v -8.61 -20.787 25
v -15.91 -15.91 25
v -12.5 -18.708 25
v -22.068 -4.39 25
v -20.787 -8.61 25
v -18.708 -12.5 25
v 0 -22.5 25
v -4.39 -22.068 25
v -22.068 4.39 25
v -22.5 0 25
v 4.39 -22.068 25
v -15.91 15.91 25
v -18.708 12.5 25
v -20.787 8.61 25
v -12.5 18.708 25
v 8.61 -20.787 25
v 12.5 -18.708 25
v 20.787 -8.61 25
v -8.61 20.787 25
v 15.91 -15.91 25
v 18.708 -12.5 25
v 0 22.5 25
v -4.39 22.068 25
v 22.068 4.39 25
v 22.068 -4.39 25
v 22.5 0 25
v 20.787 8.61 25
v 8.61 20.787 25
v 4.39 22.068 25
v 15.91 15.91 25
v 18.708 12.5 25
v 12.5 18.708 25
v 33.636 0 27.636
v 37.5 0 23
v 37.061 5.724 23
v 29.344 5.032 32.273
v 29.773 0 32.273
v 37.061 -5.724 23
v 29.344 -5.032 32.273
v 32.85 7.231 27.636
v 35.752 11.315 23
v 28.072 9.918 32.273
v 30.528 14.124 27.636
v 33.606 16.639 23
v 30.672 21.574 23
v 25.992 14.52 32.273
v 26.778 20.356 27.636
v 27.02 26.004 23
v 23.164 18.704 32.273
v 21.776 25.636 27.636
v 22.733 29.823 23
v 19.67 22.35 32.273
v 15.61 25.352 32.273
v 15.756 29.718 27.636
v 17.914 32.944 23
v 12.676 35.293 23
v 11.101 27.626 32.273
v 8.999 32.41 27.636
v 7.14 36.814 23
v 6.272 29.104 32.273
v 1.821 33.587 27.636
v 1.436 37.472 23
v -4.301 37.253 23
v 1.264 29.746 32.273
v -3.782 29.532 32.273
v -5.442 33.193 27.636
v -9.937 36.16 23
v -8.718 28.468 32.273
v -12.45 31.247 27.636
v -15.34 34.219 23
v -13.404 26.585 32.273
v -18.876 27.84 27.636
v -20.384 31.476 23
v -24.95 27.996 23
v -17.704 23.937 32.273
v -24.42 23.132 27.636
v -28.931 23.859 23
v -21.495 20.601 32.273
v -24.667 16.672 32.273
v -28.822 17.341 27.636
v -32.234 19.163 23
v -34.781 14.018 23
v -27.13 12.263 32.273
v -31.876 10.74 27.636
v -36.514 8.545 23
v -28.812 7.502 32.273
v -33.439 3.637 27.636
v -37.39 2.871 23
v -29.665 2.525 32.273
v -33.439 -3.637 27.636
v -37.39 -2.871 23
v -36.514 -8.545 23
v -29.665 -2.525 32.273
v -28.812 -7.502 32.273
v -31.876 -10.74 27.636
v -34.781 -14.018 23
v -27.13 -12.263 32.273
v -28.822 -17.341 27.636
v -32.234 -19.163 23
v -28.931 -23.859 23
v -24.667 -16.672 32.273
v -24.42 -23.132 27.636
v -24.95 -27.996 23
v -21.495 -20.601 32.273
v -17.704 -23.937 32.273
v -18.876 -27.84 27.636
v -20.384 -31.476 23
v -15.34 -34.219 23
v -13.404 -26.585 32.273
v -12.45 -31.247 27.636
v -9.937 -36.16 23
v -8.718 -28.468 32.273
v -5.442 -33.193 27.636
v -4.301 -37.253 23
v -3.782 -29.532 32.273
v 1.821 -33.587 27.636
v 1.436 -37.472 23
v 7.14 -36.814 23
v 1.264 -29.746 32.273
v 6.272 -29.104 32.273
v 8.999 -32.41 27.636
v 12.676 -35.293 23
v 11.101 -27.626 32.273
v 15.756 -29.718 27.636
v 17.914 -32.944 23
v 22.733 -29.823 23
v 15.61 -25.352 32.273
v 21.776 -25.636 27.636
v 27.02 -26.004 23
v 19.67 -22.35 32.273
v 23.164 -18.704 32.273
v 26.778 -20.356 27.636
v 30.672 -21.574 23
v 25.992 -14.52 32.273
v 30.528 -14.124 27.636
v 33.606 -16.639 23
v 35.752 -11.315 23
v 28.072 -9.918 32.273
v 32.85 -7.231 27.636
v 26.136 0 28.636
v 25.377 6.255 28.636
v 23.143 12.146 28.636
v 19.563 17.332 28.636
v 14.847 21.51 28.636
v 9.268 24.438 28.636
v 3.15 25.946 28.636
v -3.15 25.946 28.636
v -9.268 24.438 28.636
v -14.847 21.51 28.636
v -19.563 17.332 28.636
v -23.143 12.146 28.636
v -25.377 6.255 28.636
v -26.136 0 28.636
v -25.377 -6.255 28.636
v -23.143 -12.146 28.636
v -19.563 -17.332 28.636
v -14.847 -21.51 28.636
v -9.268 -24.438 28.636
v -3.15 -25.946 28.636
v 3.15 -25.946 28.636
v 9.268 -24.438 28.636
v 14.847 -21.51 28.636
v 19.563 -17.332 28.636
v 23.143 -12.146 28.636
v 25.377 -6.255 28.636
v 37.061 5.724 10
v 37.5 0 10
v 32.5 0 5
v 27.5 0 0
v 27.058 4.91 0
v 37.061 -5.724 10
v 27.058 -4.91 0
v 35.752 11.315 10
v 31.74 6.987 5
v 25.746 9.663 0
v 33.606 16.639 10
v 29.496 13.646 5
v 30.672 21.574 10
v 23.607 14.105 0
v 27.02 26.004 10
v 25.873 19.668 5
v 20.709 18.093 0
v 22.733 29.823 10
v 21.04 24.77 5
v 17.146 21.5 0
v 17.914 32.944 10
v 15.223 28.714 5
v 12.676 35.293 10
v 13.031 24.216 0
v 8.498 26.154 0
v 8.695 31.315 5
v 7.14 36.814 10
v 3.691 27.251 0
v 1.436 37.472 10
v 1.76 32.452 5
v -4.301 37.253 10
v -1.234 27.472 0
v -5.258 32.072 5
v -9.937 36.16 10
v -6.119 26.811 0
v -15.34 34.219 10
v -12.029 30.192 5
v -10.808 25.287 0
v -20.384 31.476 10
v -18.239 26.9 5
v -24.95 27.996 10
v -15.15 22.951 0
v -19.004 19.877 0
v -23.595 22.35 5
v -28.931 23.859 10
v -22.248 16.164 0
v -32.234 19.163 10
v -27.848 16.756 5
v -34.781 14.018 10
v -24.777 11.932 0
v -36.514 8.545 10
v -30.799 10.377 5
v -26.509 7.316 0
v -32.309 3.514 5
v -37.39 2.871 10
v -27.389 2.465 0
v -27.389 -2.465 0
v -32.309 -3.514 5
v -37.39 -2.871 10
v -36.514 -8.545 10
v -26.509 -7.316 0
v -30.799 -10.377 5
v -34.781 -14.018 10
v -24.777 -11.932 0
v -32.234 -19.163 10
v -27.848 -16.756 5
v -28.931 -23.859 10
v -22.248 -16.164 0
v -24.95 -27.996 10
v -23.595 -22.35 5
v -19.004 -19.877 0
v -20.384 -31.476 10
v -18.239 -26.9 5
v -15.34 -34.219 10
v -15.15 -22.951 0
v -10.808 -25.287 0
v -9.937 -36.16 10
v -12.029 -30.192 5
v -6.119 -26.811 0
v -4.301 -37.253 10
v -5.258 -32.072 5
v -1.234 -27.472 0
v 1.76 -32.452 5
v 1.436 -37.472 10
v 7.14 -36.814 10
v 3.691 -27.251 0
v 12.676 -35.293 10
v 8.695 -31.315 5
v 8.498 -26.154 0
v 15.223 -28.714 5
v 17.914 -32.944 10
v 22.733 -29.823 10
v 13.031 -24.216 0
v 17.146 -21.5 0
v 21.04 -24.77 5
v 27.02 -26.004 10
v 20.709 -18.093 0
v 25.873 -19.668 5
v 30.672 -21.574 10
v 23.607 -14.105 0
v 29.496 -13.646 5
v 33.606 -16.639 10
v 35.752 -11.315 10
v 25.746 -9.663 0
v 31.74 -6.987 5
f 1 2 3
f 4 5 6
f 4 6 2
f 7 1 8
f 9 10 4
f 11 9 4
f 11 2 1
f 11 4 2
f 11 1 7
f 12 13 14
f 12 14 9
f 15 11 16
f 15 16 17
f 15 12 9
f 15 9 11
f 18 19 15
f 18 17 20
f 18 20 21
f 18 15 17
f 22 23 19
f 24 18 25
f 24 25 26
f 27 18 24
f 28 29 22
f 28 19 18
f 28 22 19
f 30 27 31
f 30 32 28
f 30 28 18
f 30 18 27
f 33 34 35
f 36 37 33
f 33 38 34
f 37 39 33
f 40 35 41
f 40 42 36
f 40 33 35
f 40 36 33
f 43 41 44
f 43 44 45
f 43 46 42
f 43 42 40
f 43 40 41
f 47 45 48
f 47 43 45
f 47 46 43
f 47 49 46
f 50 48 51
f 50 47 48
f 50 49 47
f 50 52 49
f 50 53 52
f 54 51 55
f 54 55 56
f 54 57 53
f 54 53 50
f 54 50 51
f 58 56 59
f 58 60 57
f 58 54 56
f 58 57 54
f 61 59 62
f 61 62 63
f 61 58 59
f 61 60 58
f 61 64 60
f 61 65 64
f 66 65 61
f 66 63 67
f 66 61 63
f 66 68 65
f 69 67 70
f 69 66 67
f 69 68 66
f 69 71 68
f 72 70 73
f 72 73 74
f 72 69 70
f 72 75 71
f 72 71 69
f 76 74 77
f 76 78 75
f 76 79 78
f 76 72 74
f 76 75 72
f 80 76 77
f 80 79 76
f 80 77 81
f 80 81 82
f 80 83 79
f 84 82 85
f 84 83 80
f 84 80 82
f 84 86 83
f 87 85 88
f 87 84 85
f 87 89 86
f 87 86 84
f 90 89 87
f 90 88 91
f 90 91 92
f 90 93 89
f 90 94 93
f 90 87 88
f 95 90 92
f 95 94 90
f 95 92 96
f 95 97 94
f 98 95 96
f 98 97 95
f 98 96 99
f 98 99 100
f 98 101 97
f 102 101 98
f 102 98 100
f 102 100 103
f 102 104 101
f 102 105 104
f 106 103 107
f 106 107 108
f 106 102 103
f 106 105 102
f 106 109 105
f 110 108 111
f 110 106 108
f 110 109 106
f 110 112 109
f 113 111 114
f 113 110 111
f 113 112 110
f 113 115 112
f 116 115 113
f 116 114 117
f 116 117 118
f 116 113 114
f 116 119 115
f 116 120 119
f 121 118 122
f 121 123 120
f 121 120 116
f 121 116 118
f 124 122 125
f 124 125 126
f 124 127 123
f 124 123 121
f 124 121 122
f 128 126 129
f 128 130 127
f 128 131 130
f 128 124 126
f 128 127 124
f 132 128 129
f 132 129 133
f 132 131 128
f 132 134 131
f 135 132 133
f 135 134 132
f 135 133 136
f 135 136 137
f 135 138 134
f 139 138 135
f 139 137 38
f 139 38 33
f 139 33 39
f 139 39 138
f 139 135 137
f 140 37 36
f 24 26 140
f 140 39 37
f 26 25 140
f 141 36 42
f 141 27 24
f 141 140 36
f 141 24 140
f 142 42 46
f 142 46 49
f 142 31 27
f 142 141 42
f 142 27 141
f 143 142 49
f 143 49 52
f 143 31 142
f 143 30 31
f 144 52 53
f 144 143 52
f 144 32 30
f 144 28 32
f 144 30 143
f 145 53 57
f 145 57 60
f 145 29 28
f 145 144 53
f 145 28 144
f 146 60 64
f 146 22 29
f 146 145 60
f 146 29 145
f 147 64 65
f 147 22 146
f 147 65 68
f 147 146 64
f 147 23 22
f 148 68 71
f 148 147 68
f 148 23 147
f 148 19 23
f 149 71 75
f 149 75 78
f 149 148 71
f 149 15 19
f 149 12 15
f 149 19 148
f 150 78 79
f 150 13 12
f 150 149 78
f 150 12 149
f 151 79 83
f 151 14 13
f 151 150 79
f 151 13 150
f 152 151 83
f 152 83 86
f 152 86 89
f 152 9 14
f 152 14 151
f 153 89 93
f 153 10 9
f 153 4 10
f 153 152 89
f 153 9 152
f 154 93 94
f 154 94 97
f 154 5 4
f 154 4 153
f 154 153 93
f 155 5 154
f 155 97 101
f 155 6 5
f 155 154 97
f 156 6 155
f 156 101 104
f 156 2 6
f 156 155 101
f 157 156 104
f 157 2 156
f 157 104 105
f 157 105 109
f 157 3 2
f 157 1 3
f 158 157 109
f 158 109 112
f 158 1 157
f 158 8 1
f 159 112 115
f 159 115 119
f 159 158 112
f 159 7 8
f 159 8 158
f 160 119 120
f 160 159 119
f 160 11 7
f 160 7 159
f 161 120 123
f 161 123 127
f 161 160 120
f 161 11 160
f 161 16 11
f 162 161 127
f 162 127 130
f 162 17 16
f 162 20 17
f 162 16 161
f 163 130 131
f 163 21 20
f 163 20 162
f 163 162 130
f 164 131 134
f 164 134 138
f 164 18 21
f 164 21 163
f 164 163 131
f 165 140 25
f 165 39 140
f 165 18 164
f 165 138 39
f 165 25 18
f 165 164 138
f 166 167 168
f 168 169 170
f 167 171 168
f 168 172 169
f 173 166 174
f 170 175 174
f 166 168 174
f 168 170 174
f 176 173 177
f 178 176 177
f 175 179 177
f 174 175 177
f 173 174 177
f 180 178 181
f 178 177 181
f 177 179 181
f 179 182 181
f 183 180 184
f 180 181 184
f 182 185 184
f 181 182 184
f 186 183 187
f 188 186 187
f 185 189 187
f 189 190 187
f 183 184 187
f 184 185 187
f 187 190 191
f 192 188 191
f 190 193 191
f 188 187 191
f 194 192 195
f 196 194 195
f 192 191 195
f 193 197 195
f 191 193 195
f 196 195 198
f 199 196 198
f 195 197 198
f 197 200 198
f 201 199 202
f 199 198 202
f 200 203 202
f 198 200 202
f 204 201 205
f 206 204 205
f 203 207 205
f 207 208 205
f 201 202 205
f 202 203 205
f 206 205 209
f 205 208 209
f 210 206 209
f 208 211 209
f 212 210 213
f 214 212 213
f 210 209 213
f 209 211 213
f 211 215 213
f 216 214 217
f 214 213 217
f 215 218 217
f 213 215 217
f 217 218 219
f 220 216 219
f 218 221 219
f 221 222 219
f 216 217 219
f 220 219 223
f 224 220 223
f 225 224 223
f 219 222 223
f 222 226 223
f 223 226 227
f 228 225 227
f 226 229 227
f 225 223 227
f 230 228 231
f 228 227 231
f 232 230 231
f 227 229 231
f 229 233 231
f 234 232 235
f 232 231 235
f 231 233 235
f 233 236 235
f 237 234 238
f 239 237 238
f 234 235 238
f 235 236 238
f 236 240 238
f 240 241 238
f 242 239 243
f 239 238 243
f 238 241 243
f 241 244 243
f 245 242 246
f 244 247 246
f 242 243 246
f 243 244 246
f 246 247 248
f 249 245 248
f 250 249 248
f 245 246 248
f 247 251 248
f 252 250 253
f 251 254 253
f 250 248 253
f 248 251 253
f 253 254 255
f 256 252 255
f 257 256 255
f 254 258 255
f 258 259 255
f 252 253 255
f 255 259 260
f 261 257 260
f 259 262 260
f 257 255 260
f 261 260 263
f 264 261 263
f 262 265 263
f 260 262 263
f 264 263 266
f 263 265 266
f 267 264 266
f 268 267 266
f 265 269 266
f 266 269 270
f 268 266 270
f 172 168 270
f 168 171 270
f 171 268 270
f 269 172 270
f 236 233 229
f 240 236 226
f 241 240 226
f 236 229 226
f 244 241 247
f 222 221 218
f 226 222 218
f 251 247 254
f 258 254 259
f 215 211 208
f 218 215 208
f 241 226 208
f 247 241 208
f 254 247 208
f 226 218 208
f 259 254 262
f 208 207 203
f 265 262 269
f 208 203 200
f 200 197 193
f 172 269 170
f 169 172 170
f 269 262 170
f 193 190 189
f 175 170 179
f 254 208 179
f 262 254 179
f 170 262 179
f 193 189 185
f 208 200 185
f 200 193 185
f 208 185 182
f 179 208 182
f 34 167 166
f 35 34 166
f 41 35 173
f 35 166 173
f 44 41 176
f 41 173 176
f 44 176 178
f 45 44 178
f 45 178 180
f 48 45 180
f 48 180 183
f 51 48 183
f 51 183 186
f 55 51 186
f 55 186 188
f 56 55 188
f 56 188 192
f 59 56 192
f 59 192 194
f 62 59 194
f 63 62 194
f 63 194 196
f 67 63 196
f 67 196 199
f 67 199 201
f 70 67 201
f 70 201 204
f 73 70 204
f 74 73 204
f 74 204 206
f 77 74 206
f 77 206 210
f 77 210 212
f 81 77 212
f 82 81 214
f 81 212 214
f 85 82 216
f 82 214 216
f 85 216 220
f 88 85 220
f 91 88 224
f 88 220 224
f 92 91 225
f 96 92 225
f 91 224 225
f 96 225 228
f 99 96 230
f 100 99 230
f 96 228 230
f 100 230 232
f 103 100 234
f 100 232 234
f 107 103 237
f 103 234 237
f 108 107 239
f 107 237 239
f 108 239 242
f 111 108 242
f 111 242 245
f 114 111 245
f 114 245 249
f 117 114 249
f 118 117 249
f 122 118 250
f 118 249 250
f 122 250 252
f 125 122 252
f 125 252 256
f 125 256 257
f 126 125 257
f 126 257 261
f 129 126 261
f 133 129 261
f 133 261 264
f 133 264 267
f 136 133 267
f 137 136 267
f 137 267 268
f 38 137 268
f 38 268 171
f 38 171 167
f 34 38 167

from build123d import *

# Parameters (mm, degrees)
F0_R     = 37.5
F1_DEPTH = 35
F3_R     = 22.5
F4_DEPTH = 10


# Not quite as in the source:
# - a fillet or chamfer that OpenCascade refuses, or shapes differently, is made with other operations: its cross-section is extruded or revolved along the edge and cut away or added


with BuildPart() as f1:
    # F0 (on Top) → F1 (new body)
    with BuildSketch(Plane.XY):
        Circle(F0_R)
    extrude(amount=F1_DEPTH)

    # F2: chamfer of 10 x 12 on 1 edges, made by hand

    # F2_s1 → F2_t2 (revolve, cut)
    with BuildSketch(Plane.XZ):
        Polygon((37.5, 23), (27.5, 35), (37.5, 35), align=None)
    revolve(axis=Axis((0, 0, 35), (0, 0, 1)), mode=Mode.SUBTRACT)

    # F3 (on face) → F4 (cut)
    with BuildSketch(Plane.XY.offset(35)):
        Circle(F3_R)
    extrude(amount=-F4_DEPTH, mode=Mode.SUBTRACT)

    # F5: chamfer of 10 on 2 edges, made by hand


with BuildPart() as f5_tool2:
    # F5_s3 → F5_t4 (revolve)
    with BuildSketch(Plane.XZ):
        Polygon((32.5, 35), (22.5, 25), (22.5, 35), align=None)
    revolve(axis=Axis((0, 0, 35), (0, 0, 1)))

    split(bisect_by=Plane.XY.offset(25), keep=Keep.TOP)


with BuildPart() as f1_1:
    add(f1.part)

    # F5_t1: cut F5_tool2
    add(f5_tool2.part, mode=Mode.SUBTRACT)

    # F5_s6 → F5_t7 (revolve, cut)
    with BuildSketch(Plane.XZ):
        Polygon((37.5, 10), (27.5, 0), (37.5, 0), align=None)
    revolve(axis=Axis((0, 0, 0), (0, 0, 1)), mode=Mode.SUBTRACT)


solid = f1_1.part
